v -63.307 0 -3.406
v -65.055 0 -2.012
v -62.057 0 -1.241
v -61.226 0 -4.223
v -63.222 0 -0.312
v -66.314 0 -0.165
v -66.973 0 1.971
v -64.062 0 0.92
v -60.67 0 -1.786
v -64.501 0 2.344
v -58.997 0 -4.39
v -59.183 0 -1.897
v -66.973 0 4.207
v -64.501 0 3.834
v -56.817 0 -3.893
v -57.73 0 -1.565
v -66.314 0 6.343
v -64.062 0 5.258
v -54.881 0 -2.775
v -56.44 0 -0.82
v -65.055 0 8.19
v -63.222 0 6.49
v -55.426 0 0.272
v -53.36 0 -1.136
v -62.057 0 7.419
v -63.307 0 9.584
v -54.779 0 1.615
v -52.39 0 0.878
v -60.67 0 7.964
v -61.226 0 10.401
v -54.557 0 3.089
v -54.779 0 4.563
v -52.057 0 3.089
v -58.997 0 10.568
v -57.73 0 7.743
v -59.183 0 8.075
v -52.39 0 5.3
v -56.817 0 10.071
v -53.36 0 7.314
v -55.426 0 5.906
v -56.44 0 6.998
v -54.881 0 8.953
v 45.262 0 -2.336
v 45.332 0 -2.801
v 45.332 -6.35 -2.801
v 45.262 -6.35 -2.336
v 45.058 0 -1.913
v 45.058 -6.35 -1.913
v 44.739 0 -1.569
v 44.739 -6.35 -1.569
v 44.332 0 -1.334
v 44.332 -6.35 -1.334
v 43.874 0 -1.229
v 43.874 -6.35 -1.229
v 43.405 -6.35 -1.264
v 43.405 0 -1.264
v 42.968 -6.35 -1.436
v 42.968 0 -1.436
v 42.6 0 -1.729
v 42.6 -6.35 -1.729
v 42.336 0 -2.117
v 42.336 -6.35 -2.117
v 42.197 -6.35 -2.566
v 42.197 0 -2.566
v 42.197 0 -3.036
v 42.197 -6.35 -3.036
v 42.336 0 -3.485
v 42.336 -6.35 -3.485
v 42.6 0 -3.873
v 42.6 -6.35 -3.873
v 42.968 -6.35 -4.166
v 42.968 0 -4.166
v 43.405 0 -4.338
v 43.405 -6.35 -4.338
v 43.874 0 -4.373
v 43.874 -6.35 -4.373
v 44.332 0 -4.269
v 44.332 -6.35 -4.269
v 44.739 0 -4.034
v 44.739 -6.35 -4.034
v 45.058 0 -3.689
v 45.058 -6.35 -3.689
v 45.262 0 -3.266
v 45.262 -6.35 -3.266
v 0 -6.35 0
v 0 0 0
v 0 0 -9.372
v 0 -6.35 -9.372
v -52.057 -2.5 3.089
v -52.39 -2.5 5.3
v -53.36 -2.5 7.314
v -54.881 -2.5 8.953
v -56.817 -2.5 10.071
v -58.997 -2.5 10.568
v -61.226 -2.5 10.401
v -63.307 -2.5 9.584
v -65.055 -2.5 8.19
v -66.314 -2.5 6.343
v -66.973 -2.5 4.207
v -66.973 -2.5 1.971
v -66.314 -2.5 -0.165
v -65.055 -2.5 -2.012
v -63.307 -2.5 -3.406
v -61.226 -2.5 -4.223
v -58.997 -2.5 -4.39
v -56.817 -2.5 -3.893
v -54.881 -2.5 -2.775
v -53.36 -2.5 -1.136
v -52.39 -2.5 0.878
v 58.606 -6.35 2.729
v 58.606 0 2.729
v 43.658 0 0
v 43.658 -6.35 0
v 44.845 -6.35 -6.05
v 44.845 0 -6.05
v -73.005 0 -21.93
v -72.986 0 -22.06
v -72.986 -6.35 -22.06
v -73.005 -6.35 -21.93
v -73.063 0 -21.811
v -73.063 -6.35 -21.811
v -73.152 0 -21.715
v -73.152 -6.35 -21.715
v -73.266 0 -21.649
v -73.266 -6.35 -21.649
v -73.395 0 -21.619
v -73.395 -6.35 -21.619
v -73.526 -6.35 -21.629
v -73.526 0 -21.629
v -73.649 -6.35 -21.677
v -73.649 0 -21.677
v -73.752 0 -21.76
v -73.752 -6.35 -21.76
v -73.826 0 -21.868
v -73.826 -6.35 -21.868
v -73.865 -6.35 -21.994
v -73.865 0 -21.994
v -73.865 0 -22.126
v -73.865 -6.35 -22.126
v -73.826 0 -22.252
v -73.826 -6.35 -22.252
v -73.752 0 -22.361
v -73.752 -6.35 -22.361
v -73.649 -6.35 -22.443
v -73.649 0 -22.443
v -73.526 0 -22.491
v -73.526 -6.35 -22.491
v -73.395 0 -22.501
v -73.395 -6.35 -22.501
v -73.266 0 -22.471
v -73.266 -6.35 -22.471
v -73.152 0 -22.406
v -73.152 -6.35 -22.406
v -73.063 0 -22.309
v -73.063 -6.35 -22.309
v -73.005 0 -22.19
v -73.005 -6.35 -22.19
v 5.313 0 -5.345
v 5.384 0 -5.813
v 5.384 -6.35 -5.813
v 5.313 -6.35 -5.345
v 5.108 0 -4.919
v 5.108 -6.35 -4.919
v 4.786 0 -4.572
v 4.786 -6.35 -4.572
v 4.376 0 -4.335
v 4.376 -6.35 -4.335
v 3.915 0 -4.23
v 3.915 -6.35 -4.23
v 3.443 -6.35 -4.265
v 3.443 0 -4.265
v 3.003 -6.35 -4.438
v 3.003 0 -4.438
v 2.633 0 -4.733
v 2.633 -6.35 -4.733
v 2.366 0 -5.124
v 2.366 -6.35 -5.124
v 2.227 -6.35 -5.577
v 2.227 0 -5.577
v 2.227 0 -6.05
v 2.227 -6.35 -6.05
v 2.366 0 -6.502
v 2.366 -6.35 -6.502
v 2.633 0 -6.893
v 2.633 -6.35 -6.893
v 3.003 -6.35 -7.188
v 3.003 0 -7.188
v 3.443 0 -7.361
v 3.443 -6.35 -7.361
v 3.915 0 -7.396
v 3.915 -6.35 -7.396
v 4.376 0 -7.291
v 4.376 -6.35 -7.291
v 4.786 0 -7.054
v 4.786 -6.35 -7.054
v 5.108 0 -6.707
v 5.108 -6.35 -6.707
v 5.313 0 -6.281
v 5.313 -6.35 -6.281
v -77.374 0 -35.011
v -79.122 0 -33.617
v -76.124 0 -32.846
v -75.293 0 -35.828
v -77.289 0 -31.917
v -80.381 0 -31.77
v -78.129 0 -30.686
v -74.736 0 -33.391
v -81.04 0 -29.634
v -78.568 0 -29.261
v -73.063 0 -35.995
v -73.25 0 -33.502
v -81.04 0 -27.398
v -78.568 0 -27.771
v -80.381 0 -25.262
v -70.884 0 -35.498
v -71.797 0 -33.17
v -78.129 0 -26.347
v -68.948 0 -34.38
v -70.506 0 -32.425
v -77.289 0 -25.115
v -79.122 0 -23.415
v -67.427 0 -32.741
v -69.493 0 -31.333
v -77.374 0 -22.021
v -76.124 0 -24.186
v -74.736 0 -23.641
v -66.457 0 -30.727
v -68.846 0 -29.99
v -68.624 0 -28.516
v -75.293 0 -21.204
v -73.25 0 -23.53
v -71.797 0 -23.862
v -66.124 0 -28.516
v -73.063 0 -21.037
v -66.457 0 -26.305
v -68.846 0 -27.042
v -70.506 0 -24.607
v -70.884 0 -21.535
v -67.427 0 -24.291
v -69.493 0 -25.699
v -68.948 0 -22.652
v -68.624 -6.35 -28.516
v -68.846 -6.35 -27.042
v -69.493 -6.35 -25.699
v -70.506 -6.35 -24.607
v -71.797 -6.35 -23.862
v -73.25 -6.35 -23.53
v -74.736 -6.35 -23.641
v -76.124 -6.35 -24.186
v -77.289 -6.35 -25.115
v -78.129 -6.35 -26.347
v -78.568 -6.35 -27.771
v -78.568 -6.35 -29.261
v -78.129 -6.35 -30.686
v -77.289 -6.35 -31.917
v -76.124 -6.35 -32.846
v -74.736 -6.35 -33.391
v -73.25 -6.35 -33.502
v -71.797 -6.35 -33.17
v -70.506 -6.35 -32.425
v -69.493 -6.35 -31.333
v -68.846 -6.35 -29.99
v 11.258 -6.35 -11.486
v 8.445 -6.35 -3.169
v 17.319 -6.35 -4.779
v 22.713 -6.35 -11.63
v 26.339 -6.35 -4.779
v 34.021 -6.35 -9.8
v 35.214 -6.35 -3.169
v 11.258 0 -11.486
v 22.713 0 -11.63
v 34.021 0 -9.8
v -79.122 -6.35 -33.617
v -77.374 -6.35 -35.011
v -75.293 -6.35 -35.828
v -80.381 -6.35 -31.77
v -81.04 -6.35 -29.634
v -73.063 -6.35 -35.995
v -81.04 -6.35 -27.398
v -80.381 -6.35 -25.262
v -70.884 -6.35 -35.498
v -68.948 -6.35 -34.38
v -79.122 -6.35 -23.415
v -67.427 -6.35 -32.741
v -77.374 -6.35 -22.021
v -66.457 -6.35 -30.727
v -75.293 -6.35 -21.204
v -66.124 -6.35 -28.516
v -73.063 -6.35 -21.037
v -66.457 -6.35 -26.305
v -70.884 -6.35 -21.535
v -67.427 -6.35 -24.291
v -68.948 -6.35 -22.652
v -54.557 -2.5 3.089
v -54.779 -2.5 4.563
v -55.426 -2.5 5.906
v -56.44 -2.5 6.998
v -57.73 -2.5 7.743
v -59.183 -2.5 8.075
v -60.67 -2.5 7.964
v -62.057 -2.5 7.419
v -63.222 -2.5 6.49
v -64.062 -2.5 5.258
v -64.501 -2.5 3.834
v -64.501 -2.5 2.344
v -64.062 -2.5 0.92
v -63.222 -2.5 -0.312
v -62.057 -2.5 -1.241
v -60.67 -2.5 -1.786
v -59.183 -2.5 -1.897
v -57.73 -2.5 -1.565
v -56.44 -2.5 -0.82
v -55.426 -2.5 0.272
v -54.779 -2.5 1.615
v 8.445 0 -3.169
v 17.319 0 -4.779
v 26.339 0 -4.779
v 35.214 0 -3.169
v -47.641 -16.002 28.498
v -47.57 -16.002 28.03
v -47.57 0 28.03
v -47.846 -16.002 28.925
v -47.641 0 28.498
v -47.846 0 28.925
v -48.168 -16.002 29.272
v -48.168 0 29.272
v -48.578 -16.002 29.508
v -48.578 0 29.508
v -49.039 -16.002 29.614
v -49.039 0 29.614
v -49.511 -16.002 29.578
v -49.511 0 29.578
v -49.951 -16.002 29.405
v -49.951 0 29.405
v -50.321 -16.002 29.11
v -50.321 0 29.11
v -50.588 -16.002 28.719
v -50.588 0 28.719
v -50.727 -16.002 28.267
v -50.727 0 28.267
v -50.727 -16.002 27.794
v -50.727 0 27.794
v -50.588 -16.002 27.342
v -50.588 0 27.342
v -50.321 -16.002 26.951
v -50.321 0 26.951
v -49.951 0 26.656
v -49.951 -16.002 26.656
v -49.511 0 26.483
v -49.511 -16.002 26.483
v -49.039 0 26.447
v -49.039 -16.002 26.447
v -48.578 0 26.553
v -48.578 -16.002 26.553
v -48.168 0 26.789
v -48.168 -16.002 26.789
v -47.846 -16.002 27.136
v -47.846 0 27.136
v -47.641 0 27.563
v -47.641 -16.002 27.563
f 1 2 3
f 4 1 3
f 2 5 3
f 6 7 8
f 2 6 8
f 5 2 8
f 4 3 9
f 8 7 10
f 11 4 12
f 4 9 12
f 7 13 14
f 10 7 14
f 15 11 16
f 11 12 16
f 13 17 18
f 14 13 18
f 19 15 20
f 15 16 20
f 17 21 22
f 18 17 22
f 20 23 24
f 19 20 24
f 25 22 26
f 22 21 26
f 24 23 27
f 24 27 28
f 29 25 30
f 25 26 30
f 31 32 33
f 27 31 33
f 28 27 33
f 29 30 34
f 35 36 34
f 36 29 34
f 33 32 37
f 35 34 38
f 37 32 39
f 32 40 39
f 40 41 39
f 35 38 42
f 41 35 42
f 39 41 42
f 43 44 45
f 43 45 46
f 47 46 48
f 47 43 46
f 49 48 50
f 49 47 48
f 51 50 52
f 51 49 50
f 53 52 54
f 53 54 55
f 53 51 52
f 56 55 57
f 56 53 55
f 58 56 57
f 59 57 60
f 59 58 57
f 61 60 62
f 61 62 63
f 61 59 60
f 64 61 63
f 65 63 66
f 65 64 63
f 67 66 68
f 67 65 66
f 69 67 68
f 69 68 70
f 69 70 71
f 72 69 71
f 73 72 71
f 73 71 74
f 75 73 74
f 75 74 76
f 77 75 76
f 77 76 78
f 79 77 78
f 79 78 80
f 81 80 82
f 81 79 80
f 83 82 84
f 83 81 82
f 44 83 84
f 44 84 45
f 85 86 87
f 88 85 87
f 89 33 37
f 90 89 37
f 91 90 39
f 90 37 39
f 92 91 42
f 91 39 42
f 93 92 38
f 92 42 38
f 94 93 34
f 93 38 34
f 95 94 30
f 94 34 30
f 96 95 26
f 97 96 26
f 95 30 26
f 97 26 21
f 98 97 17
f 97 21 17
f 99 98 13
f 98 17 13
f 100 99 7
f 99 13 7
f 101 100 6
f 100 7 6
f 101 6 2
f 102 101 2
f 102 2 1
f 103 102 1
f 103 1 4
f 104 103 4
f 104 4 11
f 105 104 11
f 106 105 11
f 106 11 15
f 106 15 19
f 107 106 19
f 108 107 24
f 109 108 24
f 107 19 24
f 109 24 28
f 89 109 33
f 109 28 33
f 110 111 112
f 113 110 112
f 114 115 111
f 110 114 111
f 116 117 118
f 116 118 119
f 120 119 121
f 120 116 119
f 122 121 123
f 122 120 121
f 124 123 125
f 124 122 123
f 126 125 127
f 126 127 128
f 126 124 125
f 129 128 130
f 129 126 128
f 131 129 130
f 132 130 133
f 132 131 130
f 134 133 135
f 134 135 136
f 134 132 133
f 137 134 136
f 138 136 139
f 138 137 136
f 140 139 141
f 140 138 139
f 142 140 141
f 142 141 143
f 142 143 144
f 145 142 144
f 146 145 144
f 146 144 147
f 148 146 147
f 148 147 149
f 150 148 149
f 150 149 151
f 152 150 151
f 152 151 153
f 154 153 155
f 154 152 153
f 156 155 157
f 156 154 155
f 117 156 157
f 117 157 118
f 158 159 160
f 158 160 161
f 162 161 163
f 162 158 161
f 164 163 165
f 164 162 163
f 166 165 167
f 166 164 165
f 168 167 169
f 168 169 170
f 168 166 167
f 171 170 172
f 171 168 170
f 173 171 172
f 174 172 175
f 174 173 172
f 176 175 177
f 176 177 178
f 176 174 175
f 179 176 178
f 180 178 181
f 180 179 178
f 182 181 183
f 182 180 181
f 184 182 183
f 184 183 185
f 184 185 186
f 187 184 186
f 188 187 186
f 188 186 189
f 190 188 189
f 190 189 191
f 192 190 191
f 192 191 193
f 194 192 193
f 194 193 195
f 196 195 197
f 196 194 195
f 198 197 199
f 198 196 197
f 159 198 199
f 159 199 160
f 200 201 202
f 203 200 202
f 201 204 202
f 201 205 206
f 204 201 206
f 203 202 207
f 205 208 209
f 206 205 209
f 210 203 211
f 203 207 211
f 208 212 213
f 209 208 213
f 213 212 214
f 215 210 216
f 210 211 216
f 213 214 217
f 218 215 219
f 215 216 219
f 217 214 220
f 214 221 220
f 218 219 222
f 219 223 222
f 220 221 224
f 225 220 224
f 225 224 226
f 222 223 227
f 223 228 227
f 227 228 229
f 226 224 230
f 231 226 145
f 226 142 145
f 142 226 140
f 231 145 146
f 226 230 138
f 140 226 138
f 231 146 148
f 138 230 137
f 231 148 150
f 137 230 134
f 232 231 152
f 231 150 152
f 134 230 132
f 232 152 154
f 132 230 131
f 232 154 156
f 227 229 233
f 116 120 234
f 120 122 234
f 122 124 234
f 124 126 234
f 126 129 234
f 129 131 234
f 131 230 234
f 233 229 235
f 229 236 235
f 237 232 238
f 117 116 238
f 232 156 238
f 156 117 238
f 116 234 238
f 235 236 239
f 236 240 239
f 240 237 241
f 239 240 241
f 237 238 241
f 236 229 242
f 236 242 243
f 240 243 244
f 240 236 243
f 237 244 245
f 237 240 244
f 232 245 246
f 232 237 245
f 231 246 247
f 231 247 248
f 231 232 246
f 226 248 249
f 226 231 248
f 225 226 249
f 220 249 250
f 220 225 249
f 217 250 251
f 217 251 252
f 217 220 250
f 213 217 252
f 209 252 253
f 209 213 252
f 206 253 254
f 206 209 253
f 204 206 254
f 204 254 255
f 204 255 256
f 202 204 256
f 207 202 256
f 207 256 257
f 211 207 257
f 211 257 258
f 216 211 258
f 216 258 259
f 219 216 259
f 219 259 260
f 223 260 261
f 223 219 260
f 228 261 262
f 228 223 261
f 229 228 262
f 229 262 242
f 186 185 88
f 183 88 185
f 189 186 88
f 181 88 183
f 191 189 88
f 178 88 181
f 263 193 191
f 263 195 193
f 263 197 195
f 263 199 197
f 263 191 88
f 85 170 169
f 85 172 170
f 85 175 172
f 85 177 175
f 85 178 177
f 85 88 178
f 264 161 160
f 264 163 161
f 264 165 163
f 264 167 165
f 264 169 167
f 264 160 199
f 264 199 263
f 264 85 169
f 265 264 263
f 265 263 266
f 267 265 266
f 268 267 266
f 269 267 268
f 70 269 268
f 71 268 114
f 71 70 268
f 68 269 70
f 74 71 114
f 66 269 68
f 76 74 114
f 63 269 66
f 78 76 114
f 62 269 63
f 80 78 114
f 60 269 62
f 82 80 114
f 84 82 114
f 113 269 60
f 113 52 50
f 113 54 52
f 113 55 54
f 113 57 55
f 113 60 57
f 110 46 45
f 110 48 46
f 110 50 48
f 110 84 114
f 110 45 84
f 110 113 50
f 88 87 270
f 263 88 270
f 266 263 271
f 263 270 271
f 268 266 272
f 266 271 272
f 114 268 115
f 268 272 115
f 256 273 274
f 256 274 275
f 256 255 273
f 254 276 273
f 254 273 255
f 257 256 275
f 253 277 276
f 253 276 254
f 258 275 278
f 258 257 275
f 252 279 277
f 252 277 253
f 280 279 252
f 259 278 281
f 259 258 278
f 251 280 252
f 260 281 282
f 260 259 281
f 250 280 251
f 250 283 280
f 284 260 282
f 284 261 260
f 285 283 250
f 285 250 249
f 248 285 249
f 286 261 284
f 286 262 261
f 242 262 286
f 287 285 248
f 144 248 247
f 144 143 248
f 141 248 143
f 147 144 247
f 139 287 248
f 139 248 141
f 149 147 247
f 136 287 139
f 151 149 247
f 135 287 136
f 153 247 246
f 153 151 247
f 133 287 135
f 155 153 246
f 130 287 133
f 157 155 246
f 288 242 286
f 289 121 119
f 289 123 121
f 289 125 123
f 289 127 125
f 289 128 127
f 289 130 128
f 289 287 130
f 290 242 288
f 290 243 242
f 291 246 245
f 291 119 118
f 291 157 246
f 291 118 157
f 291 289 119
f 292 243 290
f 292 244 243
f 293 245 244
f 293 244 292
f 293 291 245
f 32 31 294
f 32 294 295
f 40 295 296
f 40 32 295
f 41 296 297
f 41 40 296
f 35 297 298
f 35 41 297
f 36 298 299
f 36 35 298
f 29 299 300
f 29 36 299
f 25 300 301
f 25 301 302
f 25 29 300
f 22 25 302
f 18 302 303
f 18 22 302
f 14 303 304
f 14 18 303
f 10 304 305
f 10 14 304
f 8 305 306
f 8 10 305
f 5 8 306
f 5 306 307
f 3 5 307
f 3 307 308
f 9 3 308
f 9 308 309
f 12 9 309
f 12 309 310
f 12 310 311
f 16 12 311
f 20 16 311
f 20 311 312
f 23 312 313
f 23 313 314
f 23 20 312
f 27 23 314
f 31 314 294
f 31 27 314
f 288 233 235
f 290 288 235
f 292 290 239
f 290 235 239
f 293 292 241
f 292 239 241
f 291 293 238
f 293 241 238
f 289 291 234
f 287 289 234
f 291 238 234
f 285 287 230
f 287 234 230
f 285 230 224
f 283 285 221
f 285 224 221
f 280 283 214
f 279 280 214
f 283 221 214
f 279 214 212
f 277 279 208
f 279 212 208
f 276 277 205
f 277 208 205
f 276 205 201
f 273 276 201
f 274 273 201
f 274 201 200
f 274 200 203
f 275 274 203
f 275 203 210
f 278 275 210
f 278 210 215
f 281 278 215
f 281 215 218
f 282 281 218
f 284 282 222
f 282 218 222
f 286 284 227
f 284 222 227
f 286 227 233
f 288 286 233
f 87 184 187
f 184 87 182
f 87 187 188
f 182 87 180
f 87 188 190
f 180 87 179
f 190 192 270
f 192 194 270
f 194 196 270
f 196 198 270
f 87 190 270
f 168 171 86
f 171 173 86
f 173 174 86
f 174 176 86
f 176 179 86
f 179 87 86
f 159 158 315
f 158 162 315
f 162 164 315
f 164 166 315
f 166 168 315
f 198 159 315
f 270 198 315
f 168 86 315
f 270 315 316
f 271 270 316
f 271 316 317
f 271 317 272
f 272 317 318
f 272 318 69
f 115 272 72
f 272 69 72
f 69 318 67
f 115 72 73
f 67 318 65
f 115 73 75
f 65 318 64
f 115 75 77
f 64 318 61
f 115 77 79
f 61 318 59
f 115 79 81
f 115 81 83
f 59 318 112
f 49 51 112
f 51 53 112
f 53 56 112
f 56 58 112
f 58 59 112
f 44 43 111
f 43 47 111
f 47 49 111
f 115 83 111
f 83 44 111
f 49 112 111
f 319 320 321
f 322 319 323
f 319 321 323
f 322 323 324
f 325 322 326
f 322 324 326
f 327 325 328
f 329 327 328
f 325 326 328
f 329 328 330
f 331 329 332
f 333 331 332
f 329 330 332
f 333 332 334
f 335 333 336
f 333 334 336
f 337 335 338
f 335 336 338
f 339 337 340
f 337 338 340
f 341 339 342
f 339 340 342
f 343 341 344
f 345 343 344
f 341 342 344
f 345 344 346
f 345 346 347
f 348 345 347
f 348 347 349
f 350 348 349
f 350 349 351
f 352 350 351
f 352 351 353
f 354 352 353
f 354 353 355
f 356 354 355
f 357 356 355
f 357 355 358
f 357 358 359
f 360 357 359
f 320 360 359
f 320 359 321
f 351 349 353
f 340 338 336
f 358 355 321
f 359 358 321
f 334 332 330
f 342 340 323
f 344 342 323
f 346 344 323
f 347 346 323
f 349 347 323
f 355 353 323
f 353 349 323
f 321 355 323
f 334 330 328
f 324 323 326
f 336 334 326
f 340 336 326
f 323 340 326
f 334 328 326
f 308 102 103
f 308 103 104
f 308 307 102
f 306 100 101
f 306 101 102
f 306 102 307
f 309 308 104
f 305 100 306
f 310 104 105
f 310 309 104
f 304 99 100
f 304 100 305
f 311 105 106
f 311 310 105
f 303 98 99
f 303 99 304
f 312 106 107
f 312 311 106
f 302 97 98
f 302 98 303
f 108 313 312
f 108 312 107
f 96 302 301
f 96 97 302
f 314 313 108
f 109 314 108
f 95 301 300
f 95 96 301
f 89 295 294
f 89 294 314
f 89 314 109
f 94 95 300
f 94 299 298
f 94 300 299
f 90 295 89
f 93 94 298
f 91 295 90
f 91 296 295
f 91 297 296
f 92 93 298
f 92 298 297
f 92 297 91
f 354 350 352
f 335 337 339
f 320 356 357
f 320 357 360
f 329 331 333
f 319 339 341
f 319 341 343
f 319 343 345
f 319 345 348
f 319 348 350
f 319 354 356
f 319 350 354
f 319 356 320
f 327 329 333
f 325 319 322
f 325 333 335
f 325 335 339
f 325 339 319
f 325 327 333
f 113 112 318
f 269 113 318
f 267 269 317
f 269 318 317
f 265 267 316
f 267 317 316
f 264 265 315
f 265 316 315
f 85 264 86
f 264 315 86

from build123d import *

# Parameters (mm, degrees)
F0_R     = 1.5875
F0_R_2   = 1.576416
F1_DEPTH = 6.35
F0_R_3   = 7.5
F0_R_4   = 5
F0_R_5   = 0.441854
F2_DEPTH = 6.35
F3_DEPTH = 16.002
F4_DEPTH = 2.5


with BuildPart() as f1:
    # F0 (on Front) → F1 (new body)
    with BuildSketch(Plane.XZ):
        with BuildLine():
            ThreePointArc((43.658202, 0), (21.829101, -4.981335), (0, 0))
            Line((0, 0), (0, -9.372278))
            ThreePointArc((0, -9.372278), (22.712581, -11.630374), (44.844568, -6.050457))
            Line((44.844568, -6.050457), (58.606395, 2.728639))
            Line((58.606395, 2.728639), (43.658202, 0))
        make_face()
        with Locations((3.796365, -5.813184)):
            Circle(F0_R, mode=Mode.SUBTRACT)
        with Locations((43.755949, -2.801067)):
            Circle(F0_R_2, mode=Mode.SUBTRACT)
    extrude(amount=F1_DEPTH)


with BuildPart() as f2:
    # F0 (on Front) → F2 (new body)
    with BuildSketch(Plane.XZ):
        with Locations((-49.157687, 28.030444)):
            Circle(F0_R)
        with Locations((-73.623779, -28.516083)):
            Circle(F0_R_3)
        with Locations((-73.623779, -28.516083)):
            Circle(F0_R_4, mode=Mode.SUBTRACT)
        with Locations((-73.427692, -22.060107)):
            Circle(F0_R_5, mode=Mode.SUBTRACT)
    extrude(amount=F2_DEPTH)

    # F0 (on Front) → F3 (join)
    with BuildSketch(Plane.XZ):
        with Locations((-49.157687, 28.030444)):
            Circle(F0_R)
    extrude(amount=F3_DEPTH)


with BuildPart() as f4:
    # F0 (on Front) → F4 (new body)
    with BuildSketch(Plane.XZ):
        with Locations((-59.557062, 3.089042)):
            Circle(F0_R_3)
        with Locations((-59.557062, 3.089042)):
            Circle(F0_R_4, mode=Mode.SUBTRACT)
    extrude(amount=F4_DEPTH)


solid = Compound([f1.part, f2.part, f4.part])
